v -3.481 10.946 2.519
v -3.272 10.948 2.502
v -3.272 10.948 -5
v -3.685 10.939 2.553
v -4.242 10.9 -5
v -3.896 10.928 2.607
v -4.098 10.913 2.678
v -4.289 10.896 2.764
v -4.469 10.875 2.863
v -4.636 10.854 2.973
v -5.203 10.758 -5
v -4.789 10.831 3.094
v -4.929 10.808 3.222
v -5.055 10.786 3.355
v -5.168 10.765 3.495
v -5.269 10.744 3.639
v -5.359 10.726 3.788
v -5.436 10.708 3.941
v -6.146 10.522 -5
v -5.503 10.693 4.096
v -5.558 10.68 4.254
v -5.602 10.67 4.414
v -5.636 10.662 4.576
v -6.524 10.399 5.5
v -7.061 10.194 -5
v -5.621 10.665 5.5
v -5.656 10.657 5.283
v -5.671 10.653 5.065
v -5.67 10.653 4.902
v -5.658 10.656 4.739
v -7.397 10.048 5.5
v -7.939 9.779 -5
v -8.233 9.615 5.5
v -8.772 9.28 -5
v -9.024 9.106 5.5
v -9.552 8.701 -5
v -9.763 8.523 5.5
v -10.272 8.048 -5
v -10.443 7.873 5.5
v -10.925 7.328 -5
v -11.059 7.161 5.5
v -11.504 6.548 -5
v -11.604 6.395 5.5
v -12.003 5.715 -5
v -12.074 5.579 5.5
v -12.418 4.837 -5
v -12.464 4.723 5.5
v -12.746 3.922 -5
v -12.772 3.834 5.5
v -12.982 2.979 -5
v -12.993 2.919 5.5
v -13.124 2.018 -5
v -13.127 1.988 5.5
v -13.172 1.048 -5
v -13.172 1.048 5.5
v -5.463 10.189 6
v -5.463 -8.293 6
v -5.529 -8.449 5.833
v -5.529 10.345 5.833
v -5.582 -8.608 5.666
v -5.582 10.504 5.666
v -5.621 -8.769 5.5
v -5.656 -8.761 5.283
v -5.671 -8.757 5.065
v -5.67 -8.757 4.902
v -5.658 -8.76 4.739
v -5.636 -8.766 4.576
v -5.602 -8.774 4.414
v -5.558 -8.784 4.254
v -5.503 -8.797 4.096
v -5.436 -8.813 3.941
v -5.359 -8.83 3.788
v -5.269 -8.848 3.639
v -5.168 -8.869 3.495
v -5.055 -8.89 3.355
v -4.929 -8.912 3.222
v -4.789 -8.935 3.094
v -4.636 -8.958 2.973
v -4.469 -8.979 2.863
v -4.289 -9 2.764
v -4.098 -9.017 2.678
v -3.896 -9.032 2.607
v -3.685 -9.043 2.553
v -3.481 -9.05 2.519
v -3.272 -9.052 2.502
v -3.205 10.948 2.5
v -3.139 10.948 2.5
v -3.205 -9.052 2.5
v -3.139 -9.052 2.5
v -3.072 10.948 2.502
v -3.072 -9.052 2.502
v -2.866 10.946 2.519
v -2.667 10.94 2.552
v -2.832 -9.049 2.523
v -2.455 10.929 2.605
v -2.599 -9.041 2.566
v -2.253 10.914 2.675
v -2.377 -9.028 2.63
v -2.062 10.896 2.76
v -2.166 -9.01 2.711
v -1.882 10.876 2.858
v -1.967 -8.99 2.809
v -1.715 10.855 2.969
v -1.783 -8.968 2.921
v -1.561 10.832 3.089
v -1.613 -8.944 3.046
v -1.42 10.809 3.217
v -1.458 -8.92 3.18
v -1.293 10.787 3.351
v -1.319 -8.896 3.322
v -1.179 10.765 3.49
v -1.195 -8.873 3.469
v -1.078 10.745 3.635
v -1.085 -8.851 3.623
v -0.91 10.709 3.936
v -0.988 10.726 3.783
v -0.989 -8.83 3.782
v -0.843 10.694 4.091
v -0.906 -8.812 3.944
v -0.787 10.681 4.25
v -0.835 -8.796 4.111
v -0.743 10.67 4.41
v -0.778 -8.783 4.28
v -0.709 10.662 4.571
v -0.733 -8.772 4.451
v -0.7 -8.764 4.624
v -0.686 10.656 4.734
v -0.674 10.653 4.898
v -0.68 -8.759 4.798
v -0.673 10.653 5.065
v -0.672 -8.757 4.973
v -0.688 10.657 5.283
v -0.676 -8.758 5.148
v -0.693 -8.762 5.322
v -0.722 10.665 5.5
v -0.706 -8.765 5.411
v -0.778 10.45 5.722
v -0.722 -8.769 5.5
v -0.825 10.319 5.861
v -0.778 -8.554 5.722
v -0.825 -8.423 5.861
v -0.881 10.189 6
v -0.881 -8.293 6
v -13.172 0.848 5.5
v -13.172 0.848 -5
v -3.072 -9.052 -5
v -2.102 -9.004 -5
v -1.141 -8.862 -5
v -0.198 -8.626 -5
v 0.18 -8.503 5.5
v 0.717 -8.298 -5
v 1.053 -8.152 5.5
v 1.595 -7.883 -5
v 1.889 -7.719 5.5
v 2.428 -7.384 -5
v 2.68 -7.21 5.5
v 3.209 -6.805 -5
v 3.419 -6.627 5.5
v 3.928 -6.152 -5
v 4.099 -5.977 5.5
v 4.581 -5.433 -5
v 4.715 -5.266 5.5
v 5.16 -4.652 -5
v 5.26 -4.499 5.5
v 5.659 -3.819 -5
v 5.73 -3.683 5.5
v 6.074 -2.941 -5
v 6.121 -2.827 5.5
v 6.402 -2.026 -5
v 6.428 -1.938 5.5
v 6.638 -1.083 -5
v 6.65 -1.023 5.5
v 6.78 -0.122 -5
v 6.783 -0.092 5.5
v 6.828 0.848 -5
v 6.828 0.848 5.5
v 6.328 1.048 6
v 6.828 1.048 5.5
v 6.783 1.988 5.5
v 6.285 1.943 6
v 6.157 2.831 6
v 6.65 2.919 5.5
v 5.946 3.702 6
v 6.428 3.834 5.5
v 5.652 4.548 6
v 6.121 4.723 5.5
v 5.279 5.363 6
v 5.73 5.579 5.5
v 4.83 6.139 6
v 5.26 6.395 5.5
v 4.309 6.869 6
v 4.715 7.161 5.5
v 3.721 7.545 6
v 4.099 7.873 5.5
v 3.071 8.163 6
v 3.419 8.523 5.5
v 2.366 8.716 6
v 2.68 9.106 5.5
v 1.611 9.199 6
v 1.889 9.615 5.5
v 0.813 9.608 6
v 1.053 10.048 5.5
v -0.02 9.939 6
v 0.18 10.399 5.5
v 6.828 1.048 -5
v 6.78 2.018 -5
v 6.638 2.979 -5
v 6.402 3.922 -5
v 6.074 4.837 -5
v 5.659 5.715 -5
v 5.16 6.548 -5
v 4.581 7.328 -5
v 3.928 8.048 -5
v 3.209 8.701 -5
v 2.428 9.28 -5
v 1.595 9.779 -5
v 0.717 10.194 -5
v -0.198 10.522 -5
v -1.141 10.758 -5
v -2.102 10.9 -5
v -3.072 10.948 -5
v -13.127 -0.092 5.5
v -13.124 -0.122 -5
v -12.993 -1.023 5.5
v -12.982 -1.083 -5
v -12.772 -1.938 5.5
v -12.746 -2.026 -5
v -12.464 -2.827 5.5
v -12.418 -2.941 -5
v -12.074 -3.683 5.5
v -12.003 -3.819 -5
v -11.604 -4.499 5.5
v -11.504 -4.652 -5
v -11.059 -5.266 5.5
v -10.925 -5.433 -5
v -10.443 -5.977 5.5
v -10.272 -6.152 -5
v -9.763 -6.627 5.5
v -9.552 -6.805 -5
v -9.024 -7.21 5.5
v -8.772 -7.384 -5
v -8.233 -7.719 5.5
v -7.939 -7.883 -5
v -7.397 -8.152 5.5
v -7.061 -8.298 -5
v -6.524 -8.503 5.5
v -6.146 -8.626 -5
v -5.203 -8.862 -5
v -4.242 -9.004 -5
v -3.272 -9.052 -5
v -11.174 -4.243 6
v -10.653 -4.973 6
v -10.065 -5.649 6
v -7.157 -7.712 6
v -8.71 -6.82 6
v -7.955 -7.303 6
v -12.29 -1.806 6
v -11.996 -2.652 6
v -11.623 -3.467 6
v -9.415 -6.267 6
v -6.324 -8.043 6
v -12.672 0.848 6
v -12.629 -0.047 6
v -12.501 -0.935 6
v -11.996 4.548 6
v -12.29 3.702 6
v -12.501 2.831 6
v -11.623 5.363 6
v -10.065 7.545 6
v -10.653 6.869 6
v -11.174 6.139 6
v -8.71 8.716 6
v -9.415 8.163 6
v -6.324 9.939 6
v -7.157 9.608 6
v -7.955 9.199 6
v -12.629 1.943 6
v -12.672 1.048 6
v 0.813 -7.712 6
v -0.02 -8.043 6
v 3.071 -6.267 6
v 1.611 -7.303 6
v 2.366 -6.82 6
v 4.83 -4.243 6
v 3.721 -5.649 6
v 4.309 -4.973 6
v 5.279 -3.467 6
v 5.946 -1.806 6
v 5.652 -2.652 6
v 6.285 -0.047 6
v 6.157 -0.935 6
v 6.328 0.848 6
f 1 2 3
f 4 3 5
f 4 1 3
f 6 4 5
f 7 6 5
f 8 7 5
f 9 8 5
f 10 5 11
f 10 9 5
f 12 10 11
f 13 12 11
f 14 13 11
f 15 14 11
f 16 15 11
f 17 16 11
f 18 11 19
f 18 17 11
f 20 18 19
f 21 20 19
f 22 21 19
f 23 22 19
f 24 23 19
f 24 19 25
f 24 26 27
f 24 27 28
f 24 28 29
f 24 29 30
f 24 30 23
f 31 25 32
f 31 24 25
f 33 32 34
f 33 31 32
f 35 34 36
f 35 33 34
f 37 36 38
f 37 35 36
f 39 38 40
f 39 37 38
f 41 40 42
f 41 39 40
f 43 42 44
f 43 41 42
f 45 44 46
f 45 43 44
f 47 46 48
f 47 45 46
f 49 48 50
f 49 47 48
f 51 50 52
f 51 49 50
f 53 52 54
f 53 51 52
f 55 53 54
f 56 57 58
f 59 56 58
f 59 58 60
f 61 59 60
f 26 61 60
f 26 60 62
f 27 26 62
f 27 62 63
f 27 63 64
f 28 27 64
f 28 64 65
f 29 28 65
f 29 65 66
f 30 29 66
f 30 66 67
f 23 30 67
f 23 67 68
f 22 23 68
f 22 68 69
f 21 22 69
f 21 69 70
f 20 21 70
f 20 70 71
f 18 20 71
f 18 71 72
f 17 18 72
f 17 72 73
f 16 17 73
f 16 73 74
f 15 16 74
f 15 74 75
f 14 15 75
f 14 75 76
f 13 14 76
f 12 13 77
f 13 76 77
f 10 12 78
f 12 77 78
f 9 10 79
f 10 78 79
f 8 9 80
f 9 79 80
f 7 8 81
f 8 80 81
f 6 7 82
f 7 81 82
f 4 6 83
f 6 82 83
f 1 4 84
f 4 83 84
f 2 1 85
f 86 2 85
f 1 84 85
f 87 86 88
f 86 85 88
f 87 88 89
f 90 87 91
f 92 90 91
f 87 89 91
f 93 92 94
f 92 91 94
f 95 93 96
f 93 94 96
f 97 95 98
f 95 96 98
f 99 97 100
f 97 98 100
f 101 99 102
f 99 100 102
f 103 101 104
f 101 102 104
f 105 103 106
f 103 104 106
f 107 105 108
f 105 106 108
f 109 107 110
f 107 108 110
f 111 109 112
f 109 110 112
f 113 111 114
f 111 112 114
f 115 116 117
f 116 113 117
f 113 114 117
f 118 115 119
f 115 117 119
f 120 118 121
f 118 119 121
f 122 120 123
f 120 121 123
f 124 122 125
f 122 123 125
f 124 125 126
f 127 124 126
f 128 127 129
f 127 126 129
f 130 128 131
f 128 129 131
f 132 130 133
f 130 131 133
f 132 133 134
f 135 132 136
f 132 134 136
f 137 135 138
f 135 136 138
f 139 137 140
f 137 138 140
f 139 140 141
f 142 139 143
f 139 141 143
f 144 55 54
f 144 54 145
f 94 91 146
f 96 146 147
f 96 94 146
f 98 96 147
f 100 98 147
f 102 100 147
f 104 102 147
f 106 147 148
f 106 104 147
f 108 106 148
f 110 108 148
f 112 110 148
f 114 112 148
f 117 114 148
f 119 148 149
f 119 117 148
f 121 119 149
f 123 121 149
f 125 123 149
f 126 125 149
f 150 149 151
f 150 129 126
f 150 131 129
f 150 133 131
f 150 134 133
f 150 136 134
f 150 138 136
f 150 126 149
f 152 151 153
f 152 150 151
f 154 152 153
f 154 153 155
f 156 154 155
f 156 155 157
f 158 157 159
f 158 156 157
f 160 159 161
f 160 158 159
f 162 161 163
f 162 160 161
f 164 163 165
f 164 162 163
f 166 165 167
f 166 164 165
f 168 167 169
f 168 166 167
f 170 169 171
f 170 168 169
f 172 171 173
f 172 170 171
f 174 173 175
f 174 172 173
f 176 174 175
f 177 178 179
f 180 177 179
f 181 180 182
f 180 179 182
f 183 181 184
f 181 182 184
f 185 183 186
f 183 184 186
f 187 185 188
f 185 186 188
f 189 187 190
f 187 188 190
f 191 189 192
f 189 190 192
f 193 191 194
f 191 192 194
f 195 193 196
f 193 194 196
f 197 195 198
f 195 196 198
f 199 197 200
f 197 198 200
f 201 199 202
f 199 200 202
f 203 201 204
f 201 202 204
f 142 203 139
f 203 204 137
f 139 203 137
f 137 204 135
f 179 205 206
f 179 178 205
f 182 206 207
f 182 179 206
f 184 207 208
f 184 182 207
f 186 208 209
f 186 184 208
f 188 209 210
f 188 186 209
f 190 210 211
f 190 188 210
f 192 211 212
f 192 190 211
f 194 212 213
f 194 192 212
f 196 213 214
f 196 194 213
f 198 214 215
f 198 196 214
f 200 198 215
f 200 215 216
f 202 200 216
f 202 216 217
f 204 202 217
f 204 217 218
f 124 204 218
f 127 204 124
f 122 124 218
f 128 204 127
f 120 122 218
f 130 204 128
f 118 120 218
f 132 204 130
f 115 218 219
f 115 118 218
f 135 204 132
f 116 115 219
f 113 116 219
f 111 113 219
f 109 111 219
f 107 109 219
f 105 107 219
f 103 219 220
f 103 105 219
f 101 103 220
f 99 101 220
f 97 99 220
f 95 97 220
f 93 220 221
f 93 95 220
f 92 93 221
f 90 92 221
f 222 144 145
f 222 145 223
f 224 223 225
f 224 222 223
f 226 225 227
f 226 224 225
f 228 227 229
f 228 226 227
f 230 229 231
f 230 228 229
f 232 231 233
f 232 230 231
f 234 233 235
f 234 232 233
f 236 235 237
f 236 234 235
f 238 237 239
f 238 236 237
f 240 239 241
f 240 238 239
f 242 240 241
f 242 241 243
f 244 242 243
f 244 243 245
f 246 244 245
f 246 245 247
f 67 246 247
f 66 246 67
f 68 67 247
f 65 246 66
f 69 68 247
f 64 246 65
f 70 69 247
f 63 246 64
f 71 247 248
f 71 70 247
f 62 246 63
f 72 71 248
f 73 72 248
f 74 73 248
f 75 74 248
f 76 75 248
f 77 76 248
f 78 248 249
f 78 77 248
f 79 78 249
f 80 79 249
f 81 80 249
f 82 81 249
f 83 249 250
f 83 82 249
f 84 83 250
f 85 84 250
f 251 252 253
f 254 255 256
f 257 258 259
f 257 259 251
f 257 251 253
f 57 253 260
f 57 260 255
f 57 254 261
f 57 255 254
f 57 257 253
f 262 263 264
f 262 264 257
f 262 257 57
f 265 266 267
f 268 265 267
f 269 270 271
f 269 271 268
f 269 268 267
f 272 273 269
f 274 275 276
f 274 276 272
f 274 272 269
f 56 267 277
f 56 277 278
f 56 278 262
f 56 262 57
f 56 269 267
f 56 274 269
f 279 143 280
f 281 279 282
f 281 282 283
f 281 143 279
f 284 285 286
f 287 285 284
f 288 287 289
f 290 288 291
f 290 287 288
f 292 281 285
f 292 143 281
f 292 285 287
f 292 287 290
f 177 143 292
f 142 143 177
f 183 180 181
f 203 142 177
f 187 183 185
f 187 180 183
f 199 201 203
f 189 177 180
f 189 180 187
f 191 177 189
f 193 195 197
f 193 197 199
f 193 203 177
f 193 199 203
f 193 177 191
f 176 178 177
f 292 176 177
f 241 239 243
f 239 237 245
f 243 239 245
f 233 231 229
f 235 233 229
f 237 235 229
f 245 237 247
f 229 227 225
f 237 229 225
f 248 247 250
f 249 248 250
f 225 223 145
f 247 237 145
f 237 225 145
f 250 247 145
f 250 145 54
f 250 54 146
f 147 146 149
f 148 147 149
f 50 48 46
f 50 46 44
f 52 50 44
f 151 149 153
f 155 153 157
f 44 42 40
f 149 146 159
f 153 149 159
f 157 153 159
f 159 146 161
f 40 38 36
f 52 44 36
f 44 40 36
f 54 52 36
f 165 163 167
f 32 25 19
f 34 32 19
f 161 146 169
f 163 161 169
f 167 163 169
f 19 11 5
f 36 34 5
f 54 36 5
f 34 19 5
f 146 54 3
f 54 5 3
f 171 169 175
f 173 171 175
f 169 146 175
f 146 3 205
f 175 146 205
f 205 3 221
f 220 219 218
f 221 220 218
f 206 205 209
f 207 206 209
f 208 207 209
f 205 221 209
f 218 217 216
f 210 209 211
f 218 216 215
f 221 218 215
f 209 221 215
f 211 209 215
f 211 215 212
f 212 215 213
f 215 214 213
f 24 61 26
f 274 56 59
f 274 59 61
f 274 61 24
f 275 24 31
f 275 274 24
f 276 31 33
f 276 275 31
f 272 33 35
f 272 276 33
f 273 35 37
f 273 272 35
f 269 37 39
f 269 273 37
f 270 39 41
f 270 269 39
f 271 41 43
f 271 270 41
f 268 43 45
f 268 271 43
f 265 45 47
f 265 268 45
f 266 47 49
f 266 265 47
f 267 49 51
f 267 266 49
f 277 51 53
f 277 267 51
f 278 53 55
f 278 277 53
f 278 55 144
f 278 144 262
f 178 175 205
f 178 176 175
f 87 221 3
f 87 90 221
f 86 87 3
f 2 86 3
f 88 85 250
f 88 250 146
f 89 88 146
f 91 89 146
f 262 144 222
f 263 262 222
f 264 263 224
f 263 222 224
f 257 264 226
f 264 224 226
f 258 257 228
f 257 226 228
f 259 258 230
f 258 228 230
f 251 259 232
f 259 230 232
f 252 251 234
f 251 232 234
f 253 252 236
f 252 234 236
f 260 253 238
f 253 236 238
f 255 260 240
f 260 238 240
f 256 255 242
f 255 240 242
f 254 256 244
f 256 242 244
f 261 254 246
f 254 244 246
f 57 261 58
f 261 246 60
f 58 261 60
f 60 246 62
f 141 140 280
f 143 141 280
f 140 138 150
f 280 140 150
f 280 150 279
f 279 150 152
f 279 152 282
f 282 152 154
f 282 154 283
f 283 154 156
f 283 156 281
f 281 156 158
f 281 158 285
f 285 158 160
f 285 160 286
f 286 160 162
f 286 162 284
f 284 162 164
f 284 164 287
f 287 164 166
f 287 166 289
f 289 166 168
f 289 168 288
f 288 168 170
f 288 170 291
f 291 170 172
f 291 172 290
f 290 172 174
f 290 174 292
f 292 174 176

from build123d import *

# Parameters (mm, degrees)
F1_DEPTH     = 6
F2_R         = 2.5
F3_DEPTH     = 25
F4_T1_DEPTH  = 0.2
F4_T4_ANGLE  = 84.656067133
F4_T6_ANGLE  = 84.656067133
F4_T8_ANGLE  = 84.656067133
F4_T10_ANGLE = 84.656067133
F5_DEPTH     = 5


# Not quite as in the source:
# - a fillet or chamfer that OpenCascade refuses, or shapes differently, is made with other operations: its cross-section is extruded or revolved along the edge and cut away or added


with BuildPart() as f1:
    # F0 (on Top) → F1 (new body)
    with BuildSketch(Plane.XY):
        with BuildLine():
            Line((-3.071964772, 10.9479769804), (-3.271964772, 10.9479769804))
            ThreePointArc((-3.271964772, 10.9479769804), (-10.2723219058, 8.0483341141), (-13.171964772, 1.0479769804))
            Line((-13.171964772, 1.0479769804), (-13.171964772, 0.8479769804))
            ThreePointArc((-13.171964772, 0.8479769804), (-10.2723219058, -6.1523801534), (-3.271964772, -9.0520230196))
            Line((-3.271964772, -9.0520230196), (-3.071964772, -9.0520230196))
            ThreePointArc((-3.071964772, -9.0520230196), (3.9283923617, -6.1523801534), (6.828035228, 0.8479769804))
            Line((6.828035228, 0.8479769804), (6.828035228, 1.0479769804))
            ThreePointArc((6.828035228, 1.0479769804), (3.9283923617, 8.0483341141), (-3.071964772, 10.9479769804))
        make_face()
    extrude(amount=F1_DEPTH)

    # F2 (on face) → F3 (cut)
    with BuildSketch(Plane.XZ.offset(9.0520230196)):
        with Locations((-3.171964772, 5)):
            Circle(F2_R)
    extrude(amount=-F3_DEPTH, mode=Mode.SUBTRACT)

    # F4: chamfer of 0.5 on 2 edges, made by hand

    # F4_s2 → F4_t1 (cut)
    with BuildSketch(Plane.XZ.offset(-1.0479769804)):
        Polygon((-13.171964772, 5.5), (-12.671964772, 6), (-13.171964772, 6), align=None)
        Polygon((6.828035228, 5.5), (6.328035228, 6), (6.828035228, 6), align=None)
    extrude(amount=F4_T1_DEPTH, mode=Mode.SUBTRACT)

    # F4_s3 → F4_t4 (revolve, cut)
    with BuildSketch(Plane.XZ.offset(-1.0479769804)):
        Polygon((6.328035228, 6), (6.828035228, 5.5), (6.828035228, 6), align=None)
    revolve(axis=Axis((-3.071964772, 1.0479769804, 6), (0, 0, 1)), revolution_arc=F4_T4_ANGLE, mode=Mode.SUBTRACT)

    # F4_s5 → F4_t6 (revolve, cut)
    with BuildSketch(Plane(origin=(-3.1464057809, -0.2943167545, 0), x_dir=(0, 0, 1), z_dir=(0.9956535782, 0.0931340552, 0))):
        Polygon((5.5, -11.2481533781), (6, -10.7481533781), (6, -11.2481533781), align=None)
    revolve(axis=Axis((-3.271964772, 1.0479769804, 6), (0, 0, 1)), revolution_arc=F4_T6_ANGLE, mode=Mode.SUBTRACT)

    # F4_s7 → F4_t8 (revolve, cut)
    with BuildSketch(Plane.XZ.offset(-0.8479769804)):
        Polygon((-12.671964772, 6), (-13.171964772, 5.5), (-13.171964772, 6), align=None)
    revolve(axis=Axis((-3.271964772, 0.8479769804, 6), (0, 0, 1)), revolution_arc=F4_T8_ANGLE, mode=Mode.SUBTRACT)

    # F4_s9 → F4_t10 (revolve, cut)
    with BuildSketch(Plane(origin=(-2.9666864224, -0.2775056939, 0), x_dir=(0, 0, 1), z_dir=(-0.9956535782, -0.0931340552, 0))):
        Polygon((6, -8.2696041486), (5.5, -8.7696041486), (6, -8.7696041486), align=None)
    revolve(axis=Axis((-3.071964772, 0.8479769804, 6), (0, 0, 1)), revolution_arc=F4_T10_ANGLE, mode=Mode.SUBTRACT)

    # F5 (add): a face of the model
    f5_faces = [f1.faces().sort_by_distance(p)[0] for p in [
        (-3.171964772, 0.9479769804, 0),
    ]]
    extrude(f5_faces, amount=F5_DEPTH)


solid = f1.part
